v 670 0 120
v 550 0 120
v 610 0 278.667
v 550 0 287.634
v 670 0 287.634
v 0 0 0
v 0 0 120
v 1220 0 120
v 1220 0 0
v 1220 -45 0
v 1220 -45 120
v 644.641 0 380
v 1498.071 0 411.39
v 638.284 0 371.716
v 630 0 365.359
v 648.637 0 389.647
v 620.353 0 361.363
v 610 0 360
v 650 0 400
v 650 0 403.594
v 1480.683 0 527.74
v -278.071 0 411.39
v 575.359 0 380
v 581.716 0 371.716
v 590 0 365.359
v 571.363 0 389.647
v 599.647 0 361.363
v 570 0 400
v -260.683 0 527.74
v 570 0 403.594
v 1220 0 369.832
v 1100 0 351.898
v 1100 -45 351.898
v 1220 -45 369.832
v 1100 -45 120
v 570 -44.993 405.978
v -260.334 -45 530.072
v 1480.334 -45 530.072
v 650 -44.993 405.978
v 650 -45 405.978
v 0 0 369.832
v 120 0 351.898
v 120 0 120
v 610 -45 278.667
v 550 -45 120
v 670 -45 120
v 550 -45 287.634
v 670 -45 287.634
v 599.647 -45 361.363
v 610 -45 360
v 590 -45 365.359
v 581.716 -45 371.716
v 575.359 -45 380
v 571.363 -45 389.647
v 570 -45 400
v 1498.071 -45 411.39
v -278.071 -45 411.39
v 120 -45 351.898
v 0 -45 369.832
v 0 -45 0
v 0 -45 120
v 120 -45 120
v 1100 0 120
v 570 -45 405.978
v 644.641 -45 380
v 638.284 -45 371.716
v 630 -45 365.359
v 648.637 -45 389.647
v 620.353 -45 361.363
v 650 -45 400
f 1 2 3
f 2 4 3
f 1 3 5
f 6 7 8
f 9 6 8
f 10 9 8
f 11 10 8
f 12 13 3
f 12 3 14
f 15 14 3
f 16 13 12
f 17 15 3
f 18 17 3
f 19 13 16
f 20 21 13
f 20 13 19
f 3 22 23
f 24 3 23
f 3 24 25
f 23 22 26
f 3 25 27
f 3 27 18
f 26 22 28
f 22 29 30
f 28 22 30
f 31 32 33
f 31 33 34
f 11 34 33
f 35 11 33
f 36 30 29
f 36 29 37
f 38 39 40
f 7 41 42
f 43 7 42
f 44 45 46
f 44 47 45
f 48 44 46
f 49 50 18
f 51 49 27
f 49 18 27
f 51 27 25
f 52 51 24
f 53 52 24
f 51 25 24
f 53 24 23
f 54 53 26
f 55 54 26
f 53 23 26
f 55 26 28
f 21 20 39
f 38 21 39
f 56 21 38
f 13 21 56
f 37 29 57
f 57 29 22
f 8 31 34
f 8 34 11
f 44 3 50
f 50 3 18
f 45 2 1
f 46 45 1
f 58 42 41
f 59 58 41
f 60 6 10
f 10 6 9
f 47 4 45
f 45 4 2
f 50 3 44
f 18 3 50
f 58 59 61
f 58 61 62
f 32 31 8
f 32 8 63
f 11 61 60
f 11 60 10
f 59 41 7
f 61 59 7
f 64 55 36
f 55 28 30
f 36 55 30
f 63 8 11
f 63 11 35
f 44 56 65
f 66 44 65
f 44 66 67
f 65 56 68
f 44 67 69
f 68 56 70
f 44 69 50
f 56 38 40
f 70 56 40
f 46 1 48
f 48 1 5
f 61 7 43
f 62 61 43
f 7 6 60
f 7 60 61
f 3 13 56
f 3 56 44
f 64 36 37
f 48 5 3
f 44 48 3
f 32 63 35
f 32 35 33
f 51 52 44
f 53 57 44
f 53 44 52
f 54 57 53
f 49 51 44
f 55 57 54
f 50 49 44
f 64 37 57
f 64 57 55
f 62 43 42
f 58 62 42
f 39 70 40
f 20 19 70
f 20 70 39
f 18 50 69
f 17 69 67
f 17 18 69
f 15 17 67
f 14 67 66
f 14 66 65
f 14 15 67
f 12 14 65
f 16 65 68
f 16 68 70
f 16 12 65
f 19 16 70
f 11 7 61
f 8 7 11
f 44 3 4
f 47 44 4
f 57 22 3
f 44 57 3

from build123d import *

# Parameters (mm, degrees)
F0_W      = 1220
F0_H      = 120
F1_DEPTH  = 45
F3_DEPTH  = 45
F5_DEPTH  = 1542.424441
F7_DEPTH  = 45
F11_DEPTH = 45


with BuildPart() as f1:
    # F0 (on Front) → F1 (new body)
    with BuildSketch(Plane.XZ):
        with Locations((610, 60)):
            Rectangle(F0_W, F0_H)
    extrude(amount=F1_DEPTH)


with BuildPart() as f3:
    # F2 (on Front) → F3 (new body)
    with BuildSketch(Plane.XZ):
        with BuildLine():
            Line((570, 400), (570, 405.97804))
            Line((570, 405.97804), (-260.33396, 530.072282))
            Line((-260.33396, 530.072282), (-278.071089, 411.390378))
            Line((-278.071089, 411.390378), (610, 278.667265))
            Line((610, 278.667265), (610, 360))
            ThreePointArc((610, 360), (581.715729, 371.715729), (570, 400))
        make_face()
    extrude(amount=F3_DEPTH)

    # F4 (on face) → F5 (cut, through all)
    with BuildSketch(Plane(origin=(-332.13535, 0, 49.637961), x_dir=(0, -1, 0), z_dir=(-0.989016, 0, 0.147809))):
        Polygon((45, 485.770086), (0, 485.770086), (0, 483.411736), align=None)
    extrude(amount=-F5_DEPTH, mode=Mode.SUBTRACT)


with BuildPart() as f7:
    # F6 (on Front) → F7 (new body)
    with BuildSketch(Plane.XZ):
        Polygon((0, 369.832375), (0, 120), (120, 120), (120, 351.898255), align=None)
    extrude(amount=F7_DEPTH)


with BuildPart() as f9_1:
    # F9: instance of F3
    add(f3.part.mirror(Plane.YZ.offset(610)))


with BuildPart() as f9_2:
    # F9: instance of F7
    add(f7.part.mirror(Plane.YZ.offset(610)))


with BuildPart() as f11:
    # F10 (on Front) → F11 (new body)
    with BuildSketch(Plane.XZ):
        Polygon((550, 120), (670, 120), (670, 287.634325), (610, 278.667265), (550, 287.634325), align=None)
    extrude(amount=F11_DEPTH)


solid = Compound([f1.part, f3.part, f7.part, f9_1.part, f9_2.part, f11.part])
